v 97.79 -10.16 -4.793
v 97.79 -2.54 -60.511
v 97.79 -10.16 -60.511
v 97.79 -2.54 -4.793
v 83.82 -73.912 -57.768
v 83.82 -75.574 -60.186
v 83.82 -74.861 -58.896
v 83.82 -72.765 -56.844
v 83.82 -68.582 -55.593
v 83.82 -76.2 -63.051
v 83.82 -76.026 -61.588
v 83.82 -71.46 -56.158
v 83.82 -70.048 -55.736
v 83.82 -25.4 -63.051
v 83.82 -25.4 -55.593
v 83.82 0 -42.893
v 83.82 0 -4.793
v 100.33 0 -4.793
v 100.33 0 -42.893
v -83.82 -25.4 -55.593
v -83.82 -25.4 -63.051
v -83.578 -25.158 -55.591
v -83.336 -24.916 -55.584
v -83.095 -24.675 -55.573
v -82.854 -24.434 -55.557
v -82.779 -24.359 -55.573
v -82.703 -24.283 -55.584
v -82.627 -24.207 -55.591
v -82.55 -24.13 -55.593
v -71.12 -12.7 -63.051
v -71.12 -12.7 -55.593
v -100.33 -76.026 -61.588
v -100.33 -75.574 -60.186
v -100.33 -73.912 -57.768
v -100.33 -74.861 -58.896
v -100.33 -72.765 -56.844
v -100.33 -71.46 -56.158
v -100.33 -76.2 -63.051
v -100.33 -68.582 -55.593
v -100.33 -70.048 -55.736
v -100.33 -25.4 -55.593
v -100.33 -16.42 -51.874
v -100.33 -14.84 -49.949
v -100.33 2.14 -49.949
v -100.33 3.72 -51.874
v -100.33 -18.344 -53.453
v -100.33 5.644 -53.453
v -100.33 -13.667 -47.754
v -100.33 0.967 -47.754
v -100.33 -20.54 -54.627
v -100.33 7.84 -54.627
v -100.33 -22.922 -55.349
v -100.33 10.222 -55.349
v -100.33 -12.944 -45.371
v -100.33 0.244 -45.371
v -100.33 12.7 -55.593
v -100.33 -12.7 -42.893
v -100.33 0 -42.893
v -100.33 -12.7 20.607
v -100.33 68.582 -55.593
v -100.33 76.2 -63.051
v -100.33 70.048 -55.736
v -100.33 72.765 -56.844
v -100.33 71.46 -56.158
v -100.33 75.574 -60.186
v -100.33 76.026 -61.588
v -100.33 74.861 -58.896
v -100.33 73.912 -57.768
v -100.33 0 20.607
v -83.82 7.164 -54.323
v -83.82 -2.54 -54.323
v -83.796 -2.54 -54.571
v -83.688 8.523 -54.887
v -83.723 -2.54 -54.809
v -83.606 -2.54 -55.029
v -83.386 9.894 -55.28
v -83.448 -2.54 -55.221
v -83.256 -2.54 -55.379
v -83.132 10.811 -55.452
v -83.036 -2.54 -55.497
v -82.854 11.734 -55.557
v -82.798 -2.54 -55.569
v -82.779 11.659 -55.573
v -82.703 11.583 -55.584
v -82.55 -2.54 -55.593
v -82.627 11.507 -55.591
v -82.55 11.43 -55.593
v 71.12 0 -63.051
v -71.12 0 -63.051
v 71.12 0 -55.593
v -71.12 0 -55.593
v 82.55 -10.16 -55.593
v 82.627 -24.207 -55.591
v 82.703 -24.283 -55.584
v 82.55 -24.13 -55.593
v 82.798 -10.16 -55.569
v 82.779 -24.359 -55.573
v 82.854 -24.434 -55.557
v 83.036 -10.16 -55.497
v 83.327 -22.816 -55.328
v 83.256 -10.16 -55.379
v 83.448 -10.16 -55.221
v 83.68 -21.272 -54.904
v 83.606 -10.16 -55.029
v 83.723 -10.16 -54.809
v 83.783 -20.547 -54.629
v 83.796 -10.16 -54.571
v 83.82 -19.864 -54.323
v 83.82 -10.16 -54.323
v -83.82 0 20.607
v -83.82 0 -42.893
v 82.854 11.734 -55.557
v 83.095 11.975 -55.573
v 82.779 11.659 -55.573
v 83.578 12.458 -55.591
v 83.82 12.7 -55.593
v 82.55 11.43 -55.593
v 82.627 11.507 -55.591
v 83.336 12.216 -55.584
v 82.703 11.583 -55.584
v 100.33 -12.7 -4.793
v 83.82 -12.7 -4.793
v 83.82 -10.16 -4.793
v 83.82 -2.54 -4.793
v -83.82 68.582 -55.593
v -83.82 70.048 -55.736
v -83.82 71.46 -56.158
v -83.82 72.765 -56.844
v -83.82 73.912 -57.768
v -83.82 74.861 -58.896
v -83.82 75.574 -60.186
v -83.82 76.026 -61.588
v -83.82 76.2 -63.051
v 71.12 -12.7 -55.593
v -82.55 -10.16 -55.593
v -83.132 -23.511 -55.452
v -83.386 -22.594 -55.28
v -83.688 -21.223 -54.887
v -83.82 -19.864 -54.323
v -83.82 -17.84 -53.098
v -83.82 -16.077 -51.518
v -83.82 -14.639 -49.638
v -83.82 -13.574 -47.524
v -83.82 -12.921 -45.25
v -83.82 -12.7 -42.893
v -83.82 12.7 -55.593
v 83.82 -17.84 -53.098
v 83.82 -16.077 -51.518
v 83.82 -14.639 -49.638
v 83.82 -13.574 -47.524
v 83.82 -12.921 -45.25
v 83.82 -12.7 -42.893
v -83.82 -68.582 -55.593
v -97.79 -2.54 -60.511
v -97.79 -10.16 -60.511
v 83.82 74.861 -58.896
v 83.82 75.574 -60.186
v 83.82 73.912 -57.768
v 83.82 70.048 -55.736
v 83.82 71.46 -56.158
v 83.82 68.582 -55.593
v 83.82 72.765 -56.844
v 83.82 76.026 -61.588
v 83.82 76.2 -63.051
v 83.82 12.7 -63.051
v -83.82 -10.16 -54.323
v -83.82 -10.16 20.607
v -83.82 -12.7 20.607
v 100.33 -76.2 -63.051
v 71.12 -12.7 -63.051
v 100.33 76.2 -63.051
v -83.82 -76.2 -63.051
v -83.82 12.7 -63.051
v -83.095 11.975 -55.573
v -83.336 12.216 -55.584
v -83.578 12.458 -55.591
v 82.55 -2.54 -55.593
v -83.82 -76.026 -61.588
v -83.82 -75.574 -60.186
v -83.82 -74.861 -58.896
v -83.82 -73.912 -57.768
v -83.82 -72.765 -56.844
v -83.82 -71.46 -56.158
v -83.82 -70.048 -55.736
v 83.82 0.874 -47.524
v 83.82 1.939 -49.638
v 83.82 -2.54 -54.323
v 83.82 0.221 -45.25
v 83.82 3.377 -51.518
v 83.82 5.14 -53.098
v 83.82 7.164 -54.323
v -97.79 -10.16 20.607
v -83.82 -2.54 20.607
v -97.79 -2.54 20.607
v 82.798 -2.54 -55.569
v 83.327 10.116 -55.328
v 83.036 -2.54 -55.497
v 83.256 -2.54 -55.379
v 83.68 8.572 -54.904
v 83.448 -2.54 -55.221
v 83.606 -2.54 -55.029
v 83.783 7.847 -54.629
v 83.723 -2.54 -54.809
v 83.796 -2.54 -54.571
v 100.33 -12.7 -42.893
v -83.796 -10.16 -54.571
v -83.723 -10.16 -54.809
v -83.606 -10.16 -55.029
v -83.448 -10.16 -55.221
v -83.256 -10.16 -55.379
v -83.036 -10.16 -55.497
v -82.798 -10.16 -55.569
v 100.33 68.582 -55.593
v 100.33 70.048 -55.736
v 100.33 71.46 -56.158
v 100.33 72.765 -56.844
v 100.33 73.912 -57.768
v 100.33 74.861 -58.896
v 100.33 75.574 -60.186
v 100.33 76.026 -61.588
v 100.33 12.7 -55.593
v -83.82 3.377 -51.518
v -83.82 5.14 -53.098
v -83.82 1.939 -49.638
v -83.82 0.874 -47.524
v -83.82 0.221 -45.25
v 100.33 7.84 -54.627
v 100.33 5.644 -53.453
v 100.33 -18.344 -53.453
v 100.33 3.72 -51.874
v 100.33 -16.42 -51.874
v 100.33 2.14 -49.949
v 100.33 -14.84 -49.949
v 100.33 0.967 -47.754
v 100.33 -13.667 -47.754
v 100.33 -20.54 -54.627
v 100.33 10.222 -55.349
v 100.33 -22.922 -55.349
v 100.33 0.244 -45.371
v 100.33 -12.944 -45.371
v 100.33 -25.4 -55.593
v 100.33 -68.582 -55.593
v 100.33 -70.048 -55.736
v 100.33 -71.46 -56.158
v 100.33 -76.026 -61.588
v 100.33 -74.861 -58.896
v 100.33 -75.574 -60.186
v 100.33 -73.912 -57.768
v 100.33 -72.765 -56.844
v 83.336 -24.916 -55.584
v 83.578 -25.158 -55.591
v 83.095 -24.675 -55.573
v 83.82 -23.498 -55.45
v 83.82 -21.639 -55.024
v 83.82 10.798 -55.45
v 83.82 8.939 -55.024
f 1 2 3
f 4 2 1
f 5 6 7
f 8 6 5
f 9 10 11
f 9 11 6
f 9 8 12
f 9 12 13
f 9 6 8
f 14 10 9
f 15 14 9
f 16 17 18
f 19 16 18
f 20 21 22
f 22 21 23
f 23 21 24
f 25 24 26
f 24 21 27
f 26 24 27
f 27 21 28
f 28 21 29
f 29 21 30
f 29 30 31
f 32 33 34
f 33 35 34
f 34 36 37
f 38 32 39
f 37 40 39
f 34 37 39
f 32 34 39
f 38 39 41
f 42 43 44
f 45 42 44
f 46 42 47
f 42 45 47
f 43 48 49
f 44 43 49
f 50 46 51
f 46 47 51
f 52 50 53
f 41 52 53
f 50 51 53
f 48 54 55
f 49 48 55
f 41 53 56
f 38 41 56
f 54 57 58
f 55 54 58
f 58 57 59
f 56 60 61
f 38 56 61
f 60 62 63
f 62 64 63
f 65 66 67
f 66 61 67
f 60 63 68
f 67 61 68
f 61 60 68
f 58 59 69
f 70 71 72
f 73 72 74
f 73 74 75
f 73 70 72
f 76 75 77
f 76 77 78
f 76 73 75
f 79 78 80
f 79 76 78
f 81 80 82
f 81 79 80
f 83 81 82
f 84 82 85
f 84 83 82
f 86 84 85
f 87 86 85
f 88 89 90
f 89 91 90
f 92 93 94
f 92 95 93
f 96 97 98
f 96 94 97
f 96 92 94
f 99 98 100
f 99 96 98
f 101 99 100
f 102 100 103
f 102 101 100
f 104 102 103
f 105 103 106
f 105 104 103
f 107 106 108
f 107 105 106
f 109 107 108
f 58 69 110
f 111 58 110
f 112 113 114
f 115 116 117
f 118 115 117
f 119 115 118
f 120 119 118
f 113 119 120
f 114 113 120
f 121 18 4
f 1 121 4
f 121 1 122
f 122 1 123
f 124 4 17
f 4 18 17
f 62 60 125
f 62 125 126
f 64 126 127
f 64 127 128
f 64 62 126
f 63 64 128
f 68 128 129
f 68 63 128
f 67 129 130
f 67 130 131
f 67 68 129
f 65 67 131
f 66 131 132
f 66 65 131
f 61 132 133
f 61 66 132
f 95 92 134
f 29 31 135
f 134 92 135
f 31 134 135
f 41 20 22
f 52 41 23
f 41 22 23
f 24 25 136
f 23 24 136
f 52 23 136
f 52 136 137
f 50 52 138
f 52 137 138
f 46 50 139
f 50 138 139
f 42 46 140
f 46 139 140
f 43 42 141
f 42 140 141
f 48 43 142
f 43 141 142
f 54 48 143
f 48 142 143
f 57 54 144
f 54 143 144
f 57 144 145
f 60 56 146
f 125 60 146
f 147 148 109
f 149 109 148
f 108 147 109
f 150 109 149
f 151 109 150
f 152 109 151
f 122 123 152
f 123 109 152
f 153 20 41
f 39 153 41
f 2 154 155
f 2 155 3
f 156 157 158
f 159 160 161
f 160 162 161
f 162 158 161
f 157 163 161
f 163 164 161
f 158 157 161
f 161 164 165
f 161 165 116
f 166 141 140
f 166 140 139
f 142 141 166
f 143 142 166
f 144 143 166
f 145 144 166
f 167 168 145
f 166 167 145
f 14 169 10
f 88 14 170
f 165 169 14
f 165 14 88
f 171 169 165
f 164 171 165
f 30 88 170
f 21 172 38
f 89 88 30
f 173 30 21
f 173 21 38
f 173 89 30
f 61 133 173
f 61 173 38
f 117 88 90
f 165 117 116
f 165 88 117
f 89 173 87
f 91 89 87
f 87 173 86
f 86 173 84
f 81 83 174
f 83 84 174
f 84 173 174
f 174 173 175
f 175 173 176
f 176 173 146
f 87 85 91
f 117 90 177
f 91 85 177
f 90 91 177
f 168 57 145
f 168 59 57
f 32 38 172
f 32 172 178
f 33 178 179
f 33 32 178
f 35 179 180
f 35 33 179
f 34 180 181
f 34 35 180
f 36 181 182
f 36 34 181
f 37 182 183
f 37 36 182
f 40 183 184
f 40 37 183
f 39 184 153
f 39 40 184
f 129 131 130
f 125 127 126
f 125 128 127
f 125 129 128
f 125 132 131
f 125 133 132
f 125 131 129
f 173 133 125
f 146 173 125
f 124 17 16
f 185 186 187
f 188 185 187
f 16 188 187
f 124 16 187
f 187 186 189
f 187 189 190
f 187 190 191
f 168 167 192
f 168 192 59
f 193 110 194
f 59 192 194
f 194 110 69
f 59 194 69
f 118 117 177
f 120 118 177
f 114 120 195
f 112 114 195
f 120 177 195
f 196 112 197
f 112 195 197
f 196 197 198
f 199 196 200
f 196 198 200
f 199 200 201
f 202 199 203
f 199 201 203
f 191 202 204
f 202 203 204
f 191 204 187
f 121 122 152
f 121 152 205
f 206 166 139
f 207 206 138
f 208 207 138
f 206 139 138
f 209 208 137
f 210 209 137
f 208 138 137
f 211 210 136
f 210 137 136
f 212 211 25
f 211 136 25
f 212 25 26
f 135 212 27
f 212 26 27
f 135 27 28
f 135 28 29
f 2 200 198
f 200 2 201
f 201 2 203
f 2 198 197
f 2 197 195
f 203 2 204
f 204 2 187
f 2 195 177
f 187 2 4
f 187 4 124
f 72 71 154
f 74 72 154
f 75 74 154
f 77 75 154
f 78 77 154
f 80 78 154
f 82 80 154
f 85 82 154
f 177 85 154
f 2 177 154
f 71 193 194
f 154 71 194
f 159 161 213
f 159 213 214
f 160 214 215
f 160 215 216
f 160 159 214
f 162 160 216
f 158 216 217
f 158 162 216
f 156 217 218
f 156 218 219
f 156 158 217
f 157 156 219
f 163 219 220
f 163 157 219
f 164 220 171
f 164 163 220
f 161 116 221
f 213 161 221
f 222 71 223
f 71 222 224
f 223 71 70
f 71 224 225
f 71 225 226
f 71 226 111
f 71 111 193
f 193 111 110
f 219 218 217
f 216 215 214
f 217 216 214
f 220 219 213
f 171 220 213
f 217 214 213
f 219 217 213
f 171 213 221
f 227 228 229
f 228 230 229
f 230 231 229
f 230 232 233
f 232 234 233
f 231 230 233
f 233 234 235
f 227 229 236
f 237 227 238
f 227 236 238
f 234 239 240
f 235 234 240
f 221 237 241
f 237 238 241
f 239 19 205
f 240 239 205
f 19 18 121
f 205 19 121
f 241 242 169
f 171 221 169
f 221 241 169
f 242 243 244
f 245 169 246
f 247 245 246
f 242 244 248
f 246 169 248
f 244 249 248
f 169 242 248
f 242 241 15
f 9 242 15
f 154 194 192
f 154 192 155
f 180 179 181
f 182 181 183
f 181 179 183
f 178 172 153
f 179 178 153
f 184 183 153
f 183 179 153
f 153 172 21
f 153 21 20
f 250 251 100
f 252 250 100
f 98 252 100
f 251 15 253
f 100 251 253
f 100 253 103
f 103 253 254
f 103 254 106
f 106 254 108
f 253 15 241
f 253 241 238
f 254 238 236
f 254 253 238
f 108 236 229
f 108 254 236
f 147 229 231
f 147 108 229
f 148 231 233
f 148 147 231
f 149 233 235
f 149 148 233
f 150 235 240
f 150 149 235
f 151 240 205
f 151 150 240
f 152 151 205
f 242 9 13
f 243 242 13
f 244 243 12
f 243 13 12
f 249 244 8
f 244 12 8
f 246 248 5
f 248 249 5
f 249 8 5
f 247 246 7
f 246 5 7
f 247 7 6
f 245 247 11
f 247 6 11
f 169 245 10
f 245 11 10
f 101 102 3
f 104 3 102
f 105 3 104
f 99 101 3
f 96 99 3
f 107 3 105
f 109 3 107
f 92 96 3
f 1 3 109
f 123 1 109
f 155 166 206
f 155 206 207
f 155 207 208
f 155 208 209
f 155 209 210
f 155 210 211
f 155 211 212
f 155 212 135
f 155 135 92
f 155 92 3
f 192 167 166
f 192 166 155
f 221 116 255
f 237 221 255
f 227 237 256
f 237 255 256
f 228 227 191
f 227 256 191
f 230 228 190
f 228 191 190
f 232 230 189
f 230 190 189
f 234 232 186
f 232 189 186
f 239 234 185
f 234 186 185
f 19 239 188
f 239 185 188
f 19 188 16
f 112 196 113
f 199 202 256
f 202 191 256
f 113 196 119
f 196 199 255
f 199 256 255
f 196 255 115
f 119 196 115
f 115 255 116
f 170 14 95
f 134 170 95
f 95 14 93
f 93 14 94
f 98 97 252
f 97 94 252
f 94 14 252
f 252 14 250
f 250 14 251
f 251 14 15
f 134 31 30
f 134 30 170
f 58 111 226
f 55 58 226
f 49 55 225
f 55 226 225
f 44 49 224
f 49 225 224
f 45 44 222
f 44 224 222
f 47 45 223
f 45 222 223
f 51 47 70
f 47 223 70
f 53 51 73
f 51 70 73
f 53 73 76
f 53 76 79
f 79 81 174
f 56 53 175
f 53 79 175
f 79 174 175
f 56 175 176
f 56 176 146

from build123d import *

# Parameters (mm, degrees)
F0_W         = 200.66
F0_H         = 3.7321411073
F1_DEPTH     = 12.7
F2_T         = -2.54
F3_W         = 16.51
F3_H         = 7.4579973676
F4_DEPTH     = 76.2
F6_START     = 11.176
F5_W         = 16.51
F5_H         = 7.4579973676
F6_DEPTH     = 65.024
F7_T1_DEPTH  = 7.4579973676
F8_T1_DEPTH  = 16.51
F8_T3_DEPTH  = 16.51
F9_T1_DEPTH  = 2.54
F9_T3_DEPTH  = 2.54
F9_T8_DEPTH  = 22.225
F9_S9_R      = 12.6999999999
F9_T10_DEPTH = 13
F9_T15_DEPTH = 22.225
F9_S16_R     = 12.6999999999
F9_T17_DEPTH = 13
F9_T22_DEPTH = 22.225
F9_S24_R     = 12.6999999999
F9_T25_DEPTH = 13
F9_T29_DEPTH = 22.225
F9_S31_R     = 12.6999999999
F9_T32_DEPTH = 13
F10_T1_DEPTH = 54.6013885108
F10_T3_DEPTH = 54.6013885108


# Not quite as in the source:
# - a fillet or chamfer that OpenCascade refuses, or shapes differently, is made with other operations: its cross-section is extruded or revolved along the edge and cut away or added


with BuildPart() as f1:
    # F0 (on Front) → F1 (new body)
    with BuildSketch(Plane.XZ):
        Polygon((83.82, -55.5934350035), (-83.82, -55.5934350035), (-83.82, 20.6065649965), (-100.33, 20.6065649965), (-100.33, -59.3192912638), (100.33, -59.3192912638), (100.33, -4.7934350035), (83.82, -4.7934350035), align=None)
        with Locations((0, -61.1853618175)):
            Rectangle(F0_W, F0_H)
    extrude(amount=F1_DEPTH)

    # F2
    f2_openings = [f1.faces().sort_by_distance(p)[0] for p in [
        (-92.075, -6.35, 20.606565),
        (-83.82, -6.35, -17.493435),
        (0, -6.35, -55.593435),
        (92.075, -6.35, -4.793435),
        (83.82, -6.35, -30.193435),
    ]]
    offset(amount=F2_T, openings=f2_openings)

    # F3 (on Front) → F4 (join)
    with BuildSketch(Plane.XZ):
        with Locations((92.075, -59.3224336873)):
            Rectangle(F3_W, F3_H)
        with Locations((-92.075, -59.3224336873)):
            Rectangle(F3_W, F3_H)
    extrude(amount=-F4_DEPTH)

    # F5 (on Front) → F6 (join)
    with BuildSketch(Plane.XZ.offset(F6_START)):
        with Locations((-92.075, -59.3224336873)):
            Rectangle(F5_W, F5_H)
        with Locations((92.075, -59.3224336873)):
            Rectangle(F5_W, F5_H)
    extrude(amount=F6_DEPTH)

    # F7: chamfer of 12.7 on 4 edges, made by hand

    # F7_s2 → F7_t1 (join)
    with BuildSketch(Plane.XY.offset(-63.0514323711)):
        Polygon((-71.12, -12.7), (-83.82, -25.4), (-83.82, -12.7), align=None)
        Polygon((-83.82, 12.7), (-71.12, 0), (-83.82, 0), align=None)
        Polygon((71.12, 0), (83.82, 12.7), (83.82, 0), align=None)
        Polygon((71.12, -12.7), (83.82, -25.4), (83.82, -12.7), align=None)
    extrude(amount=F7_T1_DEPTH)

    # F8: fillet of radius 12.7 on 4 edges, made by hand

    # F8_s2 → F8_t1 (join)
    with BuildSketch(Plane.YZ.offset(-100.33)):
        with BuildLine():
            ThreePointArc((-12.7, -42.8934350035), (-16.4197438789, -51.8736911246), (-25.4, -55.5934350035))
            Line((-25.4, -55.5934350035), (-12.7, -55.5934350035))
            Line((-12.7, -55.5934350035), (-12.7, -42.8934350035))
        make_face()
        with BuildLine():
            ThreePointArc((0, -42.8934350035), (3.7197438789, -51.8736911246), (12.7, -55.5934350035))
            Line((12.7, -55.5934350035), (0, -55.5934350035))
            Line((0, -55.5934350035), (0, -42.8934350035))
        make_face()
    extrude(amount=F8_T1_DEPTH)

    # F8_s4 → F8_t3 (join)
    with BuildSketch(Plane.YZ.offset(83.82)):
        with BuildLine():
            ThreePointArc((-25.4, -55.5934350035), (-16.4197438789, -51.8736911246), (-12.7, -42.8934350035))
            Line((-12.7, -42.8934350035), (-12.7, -55.5934350035))
            Line((-12.7, -55.5934350035), (-25.4, -55.5934350035))
        make_face()
        with BuildLine():
            ThreePointArc((12.7, -55.5934350035), (3.7197438789, -51.8736911246), (0, -42.8934350035))
            Line((0, -42.8934350035), (0, -55.5934350035))
            Line((0, -55.5934350035), (12.7, -55.5934350035))
        make_face()
    extrude(amount=F8_T3_DEPTH)

    # F9: fillet of radius 1.27 on 8 edges, made by hand

    # F9_s2 → F9_t1 (join)
    with BuildSketch(Plane.XZ):
        with BuildLine():
            ThreePointArc((-83.82, -54.3234350035), (-83.4480256121, -55.2214606156), (-82.55, -55.5934350035))
            Line((-82.55, -55.5934350035), (-83.82, -55.5934350035))
            Line((-83.82, -55.5934350035), (-83.82, -54.3234350035))
        make_face()
        with BuildLine():
            ThreePointArc((82.55, -55.5934350035), (83.4480256121, -55.2214606156), (83.82, -54.3234350035))
            Line((83.82, -54.3234350035), (83.82, -55.5934350035))
            Line((83.82, -55.5934350035), (82.55, -55.5934350035))
        make_face()
    extrude(amount=F9_T1_DEPTH)

    # F9_s4 → F9_t3 (join)
    with BuildSketch(Plane.XZ.offset(10.16)):
        with BuildLine():
            ThreePointArc((-83.82, -54.3234350035), (-83.4480256121, -55.2214606156), (-82.55, -55.5934350035))
            Line((-82.55, -55.5934350035), (-83.82, -55.5934350035))
            Line((-83.82, -55.5934350035), (-83.82, -54.3234350035))
        make_face()
        with BuildLine():
            ThreePointArc((82.55, -55.5934350035), (83.4480256121, -55.2214606156), (83.82, -54.3234350035))
            Line((83.82, -54.3234350035), (83.82, -55.5934350035))
            Line((83.82, -55.5934350035), (82.55, -55.5934350035))
        make_face()
    extrude(amount=F9_T3_DEPTH)


with BuildPart() as f9_tool6:
    # F9_s7 → F9_t8 (new body)
    with BuildSketch(Plane.XZ.offset(-22.225)):
        with BuildLine():
            ThreePointArc((-83.82, -54.3234350035), (-83.4480256121, -55.2214606156), (-82.55, -55.5934350035))
            Line((-82.55, -55.5934350035), (-83.82, -55.5934350035))
            Line((-83.82, -55.5934350035), (-83.82, -54.3234350035))
        make_face()
    extrude(amount=F9_T8_DEPTH)

    # F9_s9 → F9_t10 (cut, symmetric)
    with BuildSketch(Plane.YZ.offset(-83.2)):
        with Locations((12.6999999999, -42.8934350036)):
            Circle(F9_S9_R)
    extrude(amount=F9_T10_DEPTH, both=True, mode=Mode.SUBTRACT)

    split(bisect_by=Plane(origin=(-35.56, -35.56, 0), x_dir=(0, 0, 1), z_dir=(-0.7071067812, -0.7071067812, 0)), keep=Keep.TOP)


with BuildPart() as f1_1:
    add(f1.part)

    # F9_t5: union F9_tool6
    add(f9_tool6.part)


with BuildPart() as f9_tool13:
    # F9_s14 → F9_t15 (new body)
    with BuildSketch(Plane.XZ.offset(34.925)):
        with BuildLine():
            ThreePointArc((-83.82, -54.3234350035), (-83.4480256121, -55.2214606156), (-82.55, -55.5934350035))
            Line((-82.55, -55.5934350035), (-83.82, -55.5934350035))
            Line((-83.82, -55.5934350035), (-83.82, -54.3234350035))
        make_face()
    extrude(amount=-F9_T15_DEPTH)

    # F9_s16 → F9_t17 (cut, symmetric)
    with BuildSketch(Plane.YZ.offset(-83.2)):
        with Locations((-25.3999999999, -42.8934350036)):
            Circle(F9_S16_R)
    extrude(amount=F9_T17_DEPTH, both=True, mode=Mode.SUBTRACT)

    split(bisect_by=Plane(origin=(-29.21, 29.21, 0), x_dir=(0, 0, 1), z_dir=(-0.7071067812, 0.7071067812, 0)), keep=Keep.TOP)


with BuildPart() as f1_2:
    add(f1_1.part)

    # F9_t12: union F9_tool13
    add(f9_tool13.part)


with BuildPart() as f9_tool20:
    # F9_s21 → F9_t22 (new body)
    with BuildSketch(Plane.XZ):
        with BuildLine():
            ThreePointArc((82.55, -55.5934350035), (83.4480256121, -55.2214606156), (83.82, -54.3234350035))
            Line((83.82, -54.3234350035), (83.82, -55.5934350035))
            Line((83.82, -55.5934350035), (82.55, -55.5934350035))
        make_face()
    extrude(amount=-F9_T22_DEPTH)

    split(bisect_by=Plane(origin=(35.56, -35.56, 0), x_dir=(0, 0, 1), z_dir=(0.7071067812, -0.7071067812, 0)), keep=Keep.TOP)

    # F9_s24 → F9_t25 (cut, symmetric)
    with BuildSketch(Plane.YZ.offset(83.2)):
        with Locations((12.6999999999, -42.8934350036)):
            Circle(F9_S24_R)
    extrude(amount=F9_T25_DEPTH, both=True, mode=Mode.SUBTRACT)


with BuildPart() as f1_3:
    add(f1_2.part)

    # F9_t19: union F9_tool20
    add(f9_tool20.part)


with BuildPart() as f9_tool27:
    # F9_s28 → F9_t29 (new body)
    with BuildSketch(Plane.XZ.offset(12.7)):
        with BuildLine():
            ThreePointArc((82.55, -55.5934350035), (83.4480256121, -55.2214606156), (83.82, -54.3234350035))
            Line((83.82, -54.3234350035), (83.82, -55.5934350035))
            Line((83.82, -55.5934350035), (82.55, -55.5934350035))
        make_face()
    extrude(amount=F9_T29_DEPTH)

    split(bisect_by=Plane(origin=(29.21, 29.21, 0), x_dir=(0, 0, 1), z_dir=(0.7071067812, 0.7071067812, 0)), keep=Keep.TOP)

    # F9_s31 → F9_t32 (cut, symmetric)
    with BuildSketch(Plane.YZ.offset(83.2)):
        with Locations((-25.3999999999, -42.8934350036)):
            Circle(F9_S31_R)
    extrude(amount=F9_T32_DEPTH, both=True, mode=Mode.SUBTRACT)


with BuildPart() as f1_4:
    add(f1_3.part)

    # F9_t26: union F9_tool27
    add(f9_tool27.part)

    # F10: fillet of radius 7.62 on 4 edges, made by hand

    # F10_s2 → F10_t1 (cut)
    with BuildSketch(Plane.YZ.offset(-119.3756942554)):
        with BuildLine():
            ThreePointArc((68.5817222978, -55.5934350035), (73.9122916831, -57.7683059849), (76.2, -63.0514323711))
            Line((76.2, -63.0514323711), (76.2, -55.5934350035))
            Line((76.2, -55.5934350035), (68.5817222978, -55.5934350035))
        make_face()
        with BuildLine():
            ThreePointArc((-76.2, -63.0514323711), (-73.9122916831, -57.7683059849), (-68.5817222978, -55.5934350035))
            Line((-68.5817222978, -55.5934350035), (-76.2, -55.5934350035))
            Line((-76.2, -55.5934350035), (-76.2, -63.0514323711))
        make_face()
    extrude(amount=F10_T1_DEPTH, mode=Mode.SUBTRACT)

    # F10_s4 → F10_t3 (cut)
    with BuildSketch(Plane.YZ.offset(64.7743057446)):
        with BuildLine():
            ThreePointArc((68.5817222978, -55.5934350035), (73.9122916831, -57.7683059849), (76.2, -63.0514323711))
            Line((76.2, -63.0514323711), (76.2, -55.5934350035))
            Line((76.2, -55.5934350035), (68.5817222978, -55.5934350035))
        make_face()
        with BuildLine():
            ThreePointArc((-68.5817222978, -55.5934350035), (-73.9122916831, -57.7683059849), (-76.2, -63.0514323711))
            Line((-76.2, -63.0514323711), (-76.2, -55.5934350035))
            Line((-76.2, -55.5934350035), (-68.5817222978, -55.5934350035))
        make_face()
    extrude(amount=F10_T3_DEPTH, mode=Mode.SUBTRACT)


solid = f1_4.part
